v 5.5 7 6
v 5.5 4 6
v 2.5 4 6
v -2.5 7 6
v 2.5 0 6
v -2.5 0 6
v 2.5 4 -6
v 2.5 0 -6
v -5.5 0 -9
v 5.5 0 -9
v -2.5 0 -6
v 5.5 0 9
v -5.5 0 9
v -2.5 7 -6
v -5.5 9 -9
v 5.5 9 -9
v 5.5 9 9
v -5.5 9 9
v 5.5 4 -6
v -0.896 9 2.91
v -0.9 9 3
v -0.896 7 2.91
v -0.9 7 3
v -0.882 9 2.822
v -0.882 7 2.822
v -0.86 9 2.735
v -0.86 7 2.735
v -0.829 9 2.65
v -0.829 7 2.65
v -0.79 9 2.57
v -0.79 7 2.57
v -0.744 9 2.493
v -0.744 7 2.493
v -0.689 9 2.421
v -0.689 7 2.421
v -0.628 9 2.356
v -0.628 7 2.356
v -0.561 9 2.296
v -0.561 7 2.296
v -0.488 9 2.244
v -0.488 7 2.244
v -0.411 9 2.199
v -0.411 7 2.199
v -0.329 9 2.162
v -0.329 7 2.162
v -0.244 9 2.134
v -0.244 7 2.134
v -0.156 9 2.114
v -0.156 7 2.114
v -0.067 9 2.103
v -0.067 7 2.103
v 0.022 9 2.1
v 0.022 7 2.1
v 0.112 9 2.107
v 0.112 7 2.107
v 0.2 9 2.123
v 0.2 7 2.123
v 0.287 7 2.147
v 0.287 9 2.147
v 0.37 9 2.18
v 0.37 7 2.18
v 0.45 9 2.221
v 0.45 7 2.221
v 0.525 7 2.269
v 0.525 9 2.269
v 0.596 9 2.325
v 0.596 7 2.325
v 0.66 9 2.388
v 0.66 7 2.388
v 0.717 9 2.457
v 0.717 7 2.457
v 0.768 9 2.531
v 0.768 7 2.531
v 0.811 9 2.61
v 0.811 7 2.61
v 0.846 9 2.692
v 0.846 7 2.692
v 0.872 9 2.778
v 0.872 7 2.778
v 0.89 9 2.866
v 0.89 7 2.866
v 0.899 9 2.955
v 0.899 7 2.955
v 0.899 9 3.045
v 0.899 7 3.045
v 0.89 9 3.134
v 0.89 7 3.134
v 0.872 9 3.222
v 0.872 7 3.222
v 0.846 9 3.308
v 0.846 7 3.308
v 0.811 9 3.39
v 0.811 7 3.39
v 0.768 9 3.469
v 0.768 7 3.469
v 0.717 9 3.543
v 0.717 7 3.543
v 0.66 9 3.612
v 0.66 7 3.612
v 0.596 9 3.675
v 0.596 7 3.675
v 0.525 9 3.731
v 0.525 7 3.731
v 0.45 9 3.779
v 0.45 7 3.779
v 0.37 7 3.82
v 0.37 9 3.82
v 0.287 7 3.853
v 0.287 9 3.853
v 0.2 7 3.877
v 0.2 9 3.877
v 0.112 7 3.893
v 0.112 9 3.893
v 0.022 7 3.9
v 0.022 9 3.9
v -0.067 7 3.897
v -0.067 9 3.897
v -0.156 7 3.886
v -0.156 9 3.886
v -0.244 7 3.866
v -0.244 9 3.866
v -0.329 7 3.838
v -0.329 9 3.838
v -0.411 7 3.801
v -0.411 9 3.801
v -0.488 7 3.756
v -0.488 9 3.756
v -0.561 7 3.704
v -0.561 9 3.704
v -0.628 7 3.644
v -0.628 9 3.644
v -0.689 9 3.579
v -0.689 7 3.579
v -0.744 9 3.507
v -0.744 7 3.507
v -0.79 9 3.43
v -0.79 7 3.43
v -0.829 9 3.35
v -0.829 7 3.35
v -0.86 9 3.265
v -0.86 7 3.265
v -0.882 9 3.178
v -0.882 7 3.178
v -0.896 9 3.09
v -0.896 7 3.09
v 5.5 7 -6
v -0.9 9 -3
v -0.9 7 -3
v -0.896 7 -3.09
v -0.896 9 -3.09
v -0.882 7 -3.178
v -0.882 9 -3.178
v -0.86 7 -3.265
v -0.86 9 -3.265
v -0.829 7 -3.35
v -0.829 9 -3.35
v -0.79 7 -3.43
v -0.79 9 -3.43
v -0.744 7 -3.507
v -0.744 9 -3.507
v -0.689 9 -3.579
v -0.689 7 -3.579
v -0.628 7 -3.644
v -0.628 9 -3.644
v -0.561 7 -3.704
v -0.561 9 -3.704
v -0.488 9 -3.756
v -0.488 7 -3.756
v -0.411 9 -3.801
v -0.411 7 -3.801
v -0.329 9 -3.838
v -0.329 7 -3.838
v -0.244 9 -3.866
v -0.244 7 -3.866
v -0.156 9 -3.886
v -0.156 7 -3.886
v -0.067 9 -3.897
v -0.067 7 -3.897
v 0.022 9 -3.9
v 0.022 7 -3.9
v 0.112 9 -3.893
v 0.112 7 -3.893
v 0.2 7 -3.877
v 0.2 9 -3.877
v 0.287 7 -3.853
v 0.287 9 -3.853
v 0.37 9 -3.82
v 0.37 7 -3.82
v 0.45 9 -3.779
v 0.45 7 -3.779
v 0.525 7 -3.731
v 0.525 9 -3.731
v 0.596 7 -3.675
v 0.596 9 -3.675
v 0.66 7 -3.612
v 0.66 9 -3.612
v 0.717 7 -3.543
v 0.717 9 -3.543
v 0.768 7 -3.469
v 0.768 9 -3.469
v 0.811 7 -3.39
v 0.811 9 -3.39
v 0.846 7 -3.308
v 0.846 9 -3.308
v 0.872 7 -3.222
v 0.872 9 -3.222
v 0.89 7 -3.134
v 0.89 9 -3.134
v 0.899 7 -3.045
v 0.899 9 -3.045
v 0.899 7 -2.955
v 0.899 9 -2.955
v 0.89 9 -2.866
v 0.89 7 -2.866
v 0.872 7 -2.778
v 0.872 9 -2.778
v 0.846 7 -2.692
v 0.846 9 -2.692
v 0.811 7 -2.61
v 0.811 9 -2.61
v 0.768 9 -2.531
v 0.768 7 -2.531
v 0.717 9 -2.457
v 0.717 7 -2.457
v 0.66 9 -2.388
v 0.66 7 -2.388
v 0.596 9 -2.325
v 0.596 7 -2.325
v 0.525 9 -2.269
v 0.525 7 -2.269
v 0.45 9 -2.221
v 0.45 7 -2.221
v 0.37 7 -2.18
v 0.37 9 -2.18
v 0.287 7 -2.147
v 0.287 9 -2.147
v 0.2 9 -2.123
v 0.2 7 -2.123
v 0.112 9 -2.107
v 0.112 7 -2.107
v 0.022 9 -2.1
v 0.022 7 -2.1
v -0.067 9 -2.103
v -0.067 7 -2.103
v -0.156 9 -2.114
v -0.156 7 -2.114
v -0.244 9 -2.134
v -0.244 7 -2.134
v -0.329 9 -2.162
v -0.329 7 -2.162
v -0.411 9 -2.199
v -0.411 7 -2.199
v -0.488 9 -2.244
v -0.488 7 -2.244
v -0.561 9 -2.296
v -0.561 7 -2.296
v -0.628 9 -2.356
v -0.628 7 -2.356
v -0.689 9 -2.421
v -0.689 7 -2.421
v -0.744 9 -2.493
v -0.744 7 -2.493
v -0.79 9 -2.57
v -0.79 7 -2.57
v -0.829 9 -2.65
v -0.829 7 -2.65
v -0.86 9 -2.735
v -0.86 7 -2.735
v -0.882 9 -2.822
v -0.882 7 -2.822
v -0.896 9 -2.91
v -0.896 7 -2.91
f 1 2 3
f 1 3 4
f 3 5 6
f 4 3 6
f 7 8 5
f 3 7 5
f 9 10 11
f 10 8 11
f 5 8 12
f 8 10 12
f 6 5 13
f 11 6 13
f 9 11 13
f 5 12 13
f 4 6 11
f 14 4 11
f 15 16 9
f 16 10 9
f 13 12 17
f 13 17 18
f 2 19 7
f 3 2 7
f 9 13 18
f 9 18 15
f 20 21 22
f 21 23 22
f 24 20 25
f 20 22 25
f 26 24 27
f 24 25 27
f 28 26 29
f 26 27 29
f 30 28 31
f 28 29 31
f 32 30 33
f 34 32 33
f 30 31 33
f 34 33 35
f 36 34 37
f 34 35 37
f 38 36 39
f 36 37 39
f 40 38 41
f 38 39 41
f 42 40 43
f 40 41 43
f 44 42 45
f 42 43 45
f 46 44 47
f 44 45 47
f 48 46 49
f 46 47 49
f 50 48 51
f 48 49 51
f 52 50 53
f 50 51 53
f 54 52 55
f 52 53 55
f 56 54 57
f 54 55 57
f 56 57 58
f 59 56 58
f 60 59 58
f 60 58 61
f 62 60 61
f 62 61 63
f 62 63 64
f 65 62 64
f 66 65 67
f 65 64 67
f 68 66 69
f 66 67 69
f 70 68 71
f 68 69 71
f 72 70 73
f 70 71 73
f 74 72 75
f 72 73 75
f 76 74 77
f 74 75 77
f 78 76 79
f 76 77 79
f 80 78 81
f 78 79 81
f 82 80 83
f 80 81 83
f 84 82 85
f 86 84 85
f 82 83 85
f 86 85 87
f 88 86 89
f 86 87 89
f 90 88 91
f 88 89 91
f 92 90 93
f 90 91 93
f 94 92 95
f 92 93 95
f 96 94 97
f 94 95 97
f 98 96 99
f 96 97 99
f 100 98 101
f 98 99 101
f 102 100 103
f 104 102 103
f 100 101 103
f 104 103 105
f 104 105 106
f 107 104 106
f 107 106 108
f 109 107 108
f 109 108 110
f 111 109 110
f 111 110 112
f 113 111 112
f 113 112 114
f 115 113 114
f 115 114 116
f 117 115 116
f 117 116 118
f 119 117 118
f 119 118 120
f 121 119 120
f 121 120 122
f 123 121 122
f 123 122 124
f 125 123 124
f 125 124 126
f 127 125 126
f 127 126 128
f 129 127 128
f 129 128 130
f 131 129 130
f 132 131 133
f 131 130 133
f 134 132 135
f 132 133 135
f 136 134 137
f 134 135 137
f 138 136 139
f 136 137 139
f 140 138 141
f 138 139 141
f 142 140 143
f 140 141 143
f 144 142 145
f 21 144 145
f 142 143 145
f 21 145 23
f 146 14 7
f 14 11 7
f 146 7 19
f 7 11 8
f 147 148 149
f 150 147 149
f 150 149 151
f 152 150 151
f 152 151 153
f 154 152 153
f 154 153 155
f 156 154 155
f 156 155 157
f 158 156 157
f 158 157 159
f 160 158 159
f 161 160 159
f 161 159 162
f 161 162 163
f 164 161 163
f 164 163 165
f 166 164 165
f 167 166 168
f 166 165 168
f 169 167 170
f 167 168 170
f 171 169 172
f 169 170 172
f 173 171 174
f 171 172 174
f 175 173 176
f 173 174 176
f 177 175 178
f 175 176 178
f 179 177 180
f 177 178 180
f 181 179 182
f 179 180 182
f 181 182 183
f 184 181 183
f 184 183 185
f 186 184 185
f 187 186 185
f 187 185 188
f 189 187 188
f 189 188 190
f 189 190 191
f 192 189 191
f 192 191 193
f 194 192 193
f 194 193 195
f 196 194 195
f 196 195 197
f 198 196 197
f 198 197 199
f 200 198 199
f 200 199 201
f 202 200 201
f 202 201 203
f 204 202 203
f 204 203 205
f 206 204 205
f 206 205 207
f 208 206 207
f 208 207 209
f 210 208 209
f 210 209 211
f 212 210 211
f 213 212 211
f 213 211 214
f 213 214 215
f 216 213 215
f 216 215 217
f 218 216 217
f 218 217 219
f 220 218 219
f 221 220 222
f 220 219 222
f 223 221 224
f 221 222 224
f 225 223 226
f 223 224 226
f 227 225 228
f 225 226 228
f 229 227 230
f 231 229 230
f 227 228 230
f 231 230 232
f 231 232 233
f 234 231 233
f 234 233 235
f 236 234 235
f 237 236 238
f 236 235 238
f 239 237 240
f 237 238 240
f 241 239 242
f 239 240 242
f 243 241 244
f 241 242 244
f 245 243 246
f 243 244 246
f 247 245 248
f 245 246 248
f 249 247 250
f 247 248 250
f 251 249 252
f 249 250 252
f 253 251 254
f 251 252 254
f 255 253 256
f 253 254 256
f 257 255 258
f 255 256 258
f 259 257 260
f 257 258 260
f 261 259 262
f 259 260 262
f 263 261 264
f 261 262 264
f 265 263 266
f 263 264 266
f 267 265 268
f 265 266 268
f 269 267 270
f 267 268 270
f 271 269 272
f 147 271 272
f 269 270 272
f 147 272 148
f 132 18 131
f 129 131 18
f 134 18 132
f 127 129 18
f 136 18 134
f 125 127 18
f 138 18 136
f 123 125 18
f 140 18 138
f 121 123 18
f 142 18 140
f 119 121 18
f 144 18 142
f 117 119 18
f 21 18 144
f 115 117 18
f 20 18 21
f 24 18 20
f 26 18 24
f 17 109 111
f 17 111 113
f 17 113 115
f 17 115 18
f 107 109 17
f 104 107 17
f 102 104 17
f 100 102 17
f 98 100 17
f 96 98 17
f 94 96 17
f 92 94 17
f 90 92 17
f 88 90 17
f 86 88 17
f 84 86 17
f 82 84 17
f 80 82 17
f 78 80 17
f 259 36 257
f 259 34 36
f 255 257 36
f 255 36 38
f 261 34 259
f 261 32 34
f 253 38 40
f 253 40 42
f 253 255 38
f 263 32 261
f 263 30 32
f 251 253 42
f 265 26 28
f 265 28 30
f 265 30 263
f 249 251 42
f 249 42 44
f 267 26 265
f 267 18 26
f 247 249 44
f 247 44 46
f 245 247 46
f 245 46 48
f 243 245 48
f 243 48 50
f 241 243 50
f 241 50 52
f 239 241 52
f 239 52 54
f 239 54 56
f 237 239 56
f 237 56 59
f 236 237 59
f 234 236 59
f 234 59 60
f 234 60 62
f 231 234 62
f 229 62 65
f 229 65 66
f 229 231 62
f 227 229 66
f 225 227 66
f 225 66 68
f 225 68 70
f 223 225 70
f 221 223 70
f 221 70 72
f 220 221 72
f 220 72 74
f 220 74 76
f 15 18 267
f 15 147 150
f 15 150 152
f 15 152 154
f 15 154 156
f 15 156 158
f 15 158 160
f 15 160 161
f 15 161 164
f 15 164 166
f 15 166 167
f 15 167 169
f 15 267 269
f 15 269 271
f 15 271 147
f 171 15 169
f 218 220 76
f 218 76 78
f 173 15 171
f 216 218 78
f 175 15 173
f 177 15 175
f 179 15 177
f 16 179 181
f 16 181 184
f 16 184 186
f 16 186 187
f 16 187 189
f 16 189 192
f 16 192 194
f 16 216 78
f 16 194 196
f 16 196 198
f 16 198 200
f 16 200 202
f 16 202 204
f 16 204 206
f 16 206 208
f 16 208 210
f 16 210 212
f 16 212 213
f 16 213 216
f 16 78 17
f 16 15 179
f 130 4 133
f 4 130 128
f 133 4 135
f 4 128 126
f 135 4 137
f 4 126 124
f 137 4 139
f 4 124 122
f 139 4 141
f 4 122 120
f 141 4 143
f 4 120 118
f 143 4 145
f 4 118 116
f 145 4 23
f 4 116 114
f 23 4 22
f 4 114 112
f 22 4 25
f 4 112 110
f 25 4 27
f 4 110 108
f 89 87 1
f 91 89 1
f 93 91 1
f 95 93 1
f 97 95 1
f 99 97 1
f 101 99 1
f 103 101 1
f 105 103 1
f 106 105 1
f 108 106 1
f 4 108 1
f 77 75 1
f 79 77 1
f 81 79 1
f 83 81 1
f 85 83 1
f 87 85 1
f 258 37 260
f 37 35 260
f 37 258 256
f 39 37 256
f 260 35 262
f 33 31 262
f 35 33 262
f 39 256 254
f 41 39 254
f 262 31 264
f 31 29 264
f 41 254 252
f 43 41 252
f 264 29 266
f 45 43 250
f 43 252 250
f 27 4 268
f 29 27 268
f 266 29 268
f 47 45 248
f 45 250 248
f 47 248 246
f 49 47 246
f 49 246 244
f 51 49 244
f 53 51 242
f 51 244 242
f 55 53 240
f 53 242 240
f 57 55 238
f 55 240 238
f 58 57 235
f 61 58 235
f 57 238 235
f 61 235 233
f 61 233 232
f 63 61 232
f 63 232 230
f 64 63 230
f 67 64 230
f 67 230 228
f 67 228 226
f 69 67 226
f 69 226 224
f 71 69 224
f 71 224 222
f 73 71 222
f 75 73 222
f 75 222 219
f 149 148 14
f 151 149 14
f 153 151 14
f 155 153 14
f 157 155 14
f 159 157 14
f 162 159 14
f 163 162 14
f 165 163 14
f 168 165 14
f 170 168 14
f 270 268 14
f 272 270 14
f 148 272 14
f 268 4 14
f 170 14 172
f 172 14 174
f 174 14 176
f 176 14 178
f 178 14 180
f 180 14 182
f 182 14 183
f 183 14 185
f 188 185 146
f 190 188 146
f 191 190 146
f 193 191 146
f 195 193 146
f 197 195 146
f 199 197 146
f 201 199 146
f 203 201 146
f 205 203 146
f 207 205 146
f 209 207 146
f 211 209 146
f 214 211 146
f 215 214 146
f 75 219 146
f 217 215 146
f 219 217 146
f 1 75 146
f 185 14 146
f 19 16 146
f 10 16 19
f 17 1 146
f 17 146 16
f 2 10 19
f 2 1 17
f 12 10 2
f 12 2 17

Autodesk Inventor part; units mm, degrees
ref_plane "YZ Plane" through (0, 0, 0) normal (1, 0, 0) x (0, 1, 0)
ref_plane "XZ Plane" through (0, 0, 0) normal (0, 1, 0) x (-1, 0, 0)
ref_plane "XY Plane" through (0, 0, 0) normal (0, 0, 1) x (1, 0, 0)
sketch "Sketch2" plane through (0, 0, 0) normal (0, 1, 0) x (-1, 0, 0)
  line L0 (-2.5, 6) -> (2.5, 6)
  line L1 (2.5, 6) -> (2.5, -6)
  line L2 (2.5, -6) -> (-2.5, -6)
  line L3 (-2.5, -6) -> (-2.5, 6)
  line L4 (-2.5, 6) -> (2.5, -6) construction
  line L5 (2.5, 6) -> (-2.5, -6) construction
  line L6 (-5.5, 9) -> (5.5, 9)
  line L7 (5.5, 9) -> (5.5, -9)
  line L8 (5.5, -9) -> (-5.5, -9)
  line L9 (-5.5, -9) -> (-5.5, 9)
  line L10 (-5.5, 9) -> (5.5, -9) construction
  line L11 (5.5, 9) -> (-5.5, -9) construction
  line L12 (-2.5, 0) -> (2.5, 0)
  circle A0 centre (0, -3) radius 0.9
  circle A1 centre (0, 3) radius 0.9
  point P0 (0, 0)
  dimension "d2" = 5
  dimension "d3" = 12
  dimension "d4" = 11
  dimension "d5" = 18
  dimension "d13" = 1.8
  dimension "d14" = 2.5
  dimension "d15" = 3
extrude "Extrusion2" add sketch "Sketch2" along normal blind 4 contours L6 L7 L8 L9
sketch "Sketch3" plane through (0, 4, 0) normal (0, 1, 0) x (1, 0, 0)
  line L0 (-2.5, 6) -> (2.5, 6) projected
  line L1 (2.5, -6) -> (-2.5, -6)
  line L2 (-2.5, -6) -> (-2.5, 6)
  line L3 (-2.5, 6) -> (2.5, 6)
  line L4 (2.5, 6) -> (2.5, -6)
  line L5 (2.5, -6) -> (-2.5, 6) construction
  line L6 (-2.5, -6) -> (2.5, 6) construction
  line L7 (5.5, 9) -> (-5.5, 9)
  line L8 (-5.5, 9) -> (-5.5, -9)
  line L9 (-5.5, -9) -> (5.5, -9)
  line L10 (5.5, -9) -> (5.5, 9)
  line L11 (5.5, 9) -> (-5.5, -9) construction
  line L12 (-5.5, 9) -> (5.5, -9) construction
  line L13 (2.5, -6) -> (5.5, -6)
  line L14 (2.5, 6) -> (5.5, 6)
  point P0 (0, 0)
extrude "Extrusion3" add sketch "Sketch3" along normal blind 3 contours L2 L1 L13 L10 L9 L8 L7 L14 L0
sketch "Sketch4" plane through (0, 7, 0) normal (0, 1, 0) x (1, 0, 0)
  line L0 (5.5, 9) -> (-5.5, 9) projected
  line L1 (5.5, -9) -> (-5.5, -9)
  line L2 (-5.5, -9) -> (-5.5, 9)
  line L3 (-5.5, 9) -> (5.5, 9)
  line L4 (5.5, 9) -> (5.5, -9)
  line L5 (5.5, -9) -> (-5.5, 9) construction
  line L6 (-5.5, -9) -> (5.5, 9) construction
  point P0 (0, 0)
extrude "Extrusion4" add sketch "Sketch4" along normal blind 2
extrude "Extrusion5" cut sketch "Sketch2" along normal through all contours A0 | A1
properties part number "pokus"
